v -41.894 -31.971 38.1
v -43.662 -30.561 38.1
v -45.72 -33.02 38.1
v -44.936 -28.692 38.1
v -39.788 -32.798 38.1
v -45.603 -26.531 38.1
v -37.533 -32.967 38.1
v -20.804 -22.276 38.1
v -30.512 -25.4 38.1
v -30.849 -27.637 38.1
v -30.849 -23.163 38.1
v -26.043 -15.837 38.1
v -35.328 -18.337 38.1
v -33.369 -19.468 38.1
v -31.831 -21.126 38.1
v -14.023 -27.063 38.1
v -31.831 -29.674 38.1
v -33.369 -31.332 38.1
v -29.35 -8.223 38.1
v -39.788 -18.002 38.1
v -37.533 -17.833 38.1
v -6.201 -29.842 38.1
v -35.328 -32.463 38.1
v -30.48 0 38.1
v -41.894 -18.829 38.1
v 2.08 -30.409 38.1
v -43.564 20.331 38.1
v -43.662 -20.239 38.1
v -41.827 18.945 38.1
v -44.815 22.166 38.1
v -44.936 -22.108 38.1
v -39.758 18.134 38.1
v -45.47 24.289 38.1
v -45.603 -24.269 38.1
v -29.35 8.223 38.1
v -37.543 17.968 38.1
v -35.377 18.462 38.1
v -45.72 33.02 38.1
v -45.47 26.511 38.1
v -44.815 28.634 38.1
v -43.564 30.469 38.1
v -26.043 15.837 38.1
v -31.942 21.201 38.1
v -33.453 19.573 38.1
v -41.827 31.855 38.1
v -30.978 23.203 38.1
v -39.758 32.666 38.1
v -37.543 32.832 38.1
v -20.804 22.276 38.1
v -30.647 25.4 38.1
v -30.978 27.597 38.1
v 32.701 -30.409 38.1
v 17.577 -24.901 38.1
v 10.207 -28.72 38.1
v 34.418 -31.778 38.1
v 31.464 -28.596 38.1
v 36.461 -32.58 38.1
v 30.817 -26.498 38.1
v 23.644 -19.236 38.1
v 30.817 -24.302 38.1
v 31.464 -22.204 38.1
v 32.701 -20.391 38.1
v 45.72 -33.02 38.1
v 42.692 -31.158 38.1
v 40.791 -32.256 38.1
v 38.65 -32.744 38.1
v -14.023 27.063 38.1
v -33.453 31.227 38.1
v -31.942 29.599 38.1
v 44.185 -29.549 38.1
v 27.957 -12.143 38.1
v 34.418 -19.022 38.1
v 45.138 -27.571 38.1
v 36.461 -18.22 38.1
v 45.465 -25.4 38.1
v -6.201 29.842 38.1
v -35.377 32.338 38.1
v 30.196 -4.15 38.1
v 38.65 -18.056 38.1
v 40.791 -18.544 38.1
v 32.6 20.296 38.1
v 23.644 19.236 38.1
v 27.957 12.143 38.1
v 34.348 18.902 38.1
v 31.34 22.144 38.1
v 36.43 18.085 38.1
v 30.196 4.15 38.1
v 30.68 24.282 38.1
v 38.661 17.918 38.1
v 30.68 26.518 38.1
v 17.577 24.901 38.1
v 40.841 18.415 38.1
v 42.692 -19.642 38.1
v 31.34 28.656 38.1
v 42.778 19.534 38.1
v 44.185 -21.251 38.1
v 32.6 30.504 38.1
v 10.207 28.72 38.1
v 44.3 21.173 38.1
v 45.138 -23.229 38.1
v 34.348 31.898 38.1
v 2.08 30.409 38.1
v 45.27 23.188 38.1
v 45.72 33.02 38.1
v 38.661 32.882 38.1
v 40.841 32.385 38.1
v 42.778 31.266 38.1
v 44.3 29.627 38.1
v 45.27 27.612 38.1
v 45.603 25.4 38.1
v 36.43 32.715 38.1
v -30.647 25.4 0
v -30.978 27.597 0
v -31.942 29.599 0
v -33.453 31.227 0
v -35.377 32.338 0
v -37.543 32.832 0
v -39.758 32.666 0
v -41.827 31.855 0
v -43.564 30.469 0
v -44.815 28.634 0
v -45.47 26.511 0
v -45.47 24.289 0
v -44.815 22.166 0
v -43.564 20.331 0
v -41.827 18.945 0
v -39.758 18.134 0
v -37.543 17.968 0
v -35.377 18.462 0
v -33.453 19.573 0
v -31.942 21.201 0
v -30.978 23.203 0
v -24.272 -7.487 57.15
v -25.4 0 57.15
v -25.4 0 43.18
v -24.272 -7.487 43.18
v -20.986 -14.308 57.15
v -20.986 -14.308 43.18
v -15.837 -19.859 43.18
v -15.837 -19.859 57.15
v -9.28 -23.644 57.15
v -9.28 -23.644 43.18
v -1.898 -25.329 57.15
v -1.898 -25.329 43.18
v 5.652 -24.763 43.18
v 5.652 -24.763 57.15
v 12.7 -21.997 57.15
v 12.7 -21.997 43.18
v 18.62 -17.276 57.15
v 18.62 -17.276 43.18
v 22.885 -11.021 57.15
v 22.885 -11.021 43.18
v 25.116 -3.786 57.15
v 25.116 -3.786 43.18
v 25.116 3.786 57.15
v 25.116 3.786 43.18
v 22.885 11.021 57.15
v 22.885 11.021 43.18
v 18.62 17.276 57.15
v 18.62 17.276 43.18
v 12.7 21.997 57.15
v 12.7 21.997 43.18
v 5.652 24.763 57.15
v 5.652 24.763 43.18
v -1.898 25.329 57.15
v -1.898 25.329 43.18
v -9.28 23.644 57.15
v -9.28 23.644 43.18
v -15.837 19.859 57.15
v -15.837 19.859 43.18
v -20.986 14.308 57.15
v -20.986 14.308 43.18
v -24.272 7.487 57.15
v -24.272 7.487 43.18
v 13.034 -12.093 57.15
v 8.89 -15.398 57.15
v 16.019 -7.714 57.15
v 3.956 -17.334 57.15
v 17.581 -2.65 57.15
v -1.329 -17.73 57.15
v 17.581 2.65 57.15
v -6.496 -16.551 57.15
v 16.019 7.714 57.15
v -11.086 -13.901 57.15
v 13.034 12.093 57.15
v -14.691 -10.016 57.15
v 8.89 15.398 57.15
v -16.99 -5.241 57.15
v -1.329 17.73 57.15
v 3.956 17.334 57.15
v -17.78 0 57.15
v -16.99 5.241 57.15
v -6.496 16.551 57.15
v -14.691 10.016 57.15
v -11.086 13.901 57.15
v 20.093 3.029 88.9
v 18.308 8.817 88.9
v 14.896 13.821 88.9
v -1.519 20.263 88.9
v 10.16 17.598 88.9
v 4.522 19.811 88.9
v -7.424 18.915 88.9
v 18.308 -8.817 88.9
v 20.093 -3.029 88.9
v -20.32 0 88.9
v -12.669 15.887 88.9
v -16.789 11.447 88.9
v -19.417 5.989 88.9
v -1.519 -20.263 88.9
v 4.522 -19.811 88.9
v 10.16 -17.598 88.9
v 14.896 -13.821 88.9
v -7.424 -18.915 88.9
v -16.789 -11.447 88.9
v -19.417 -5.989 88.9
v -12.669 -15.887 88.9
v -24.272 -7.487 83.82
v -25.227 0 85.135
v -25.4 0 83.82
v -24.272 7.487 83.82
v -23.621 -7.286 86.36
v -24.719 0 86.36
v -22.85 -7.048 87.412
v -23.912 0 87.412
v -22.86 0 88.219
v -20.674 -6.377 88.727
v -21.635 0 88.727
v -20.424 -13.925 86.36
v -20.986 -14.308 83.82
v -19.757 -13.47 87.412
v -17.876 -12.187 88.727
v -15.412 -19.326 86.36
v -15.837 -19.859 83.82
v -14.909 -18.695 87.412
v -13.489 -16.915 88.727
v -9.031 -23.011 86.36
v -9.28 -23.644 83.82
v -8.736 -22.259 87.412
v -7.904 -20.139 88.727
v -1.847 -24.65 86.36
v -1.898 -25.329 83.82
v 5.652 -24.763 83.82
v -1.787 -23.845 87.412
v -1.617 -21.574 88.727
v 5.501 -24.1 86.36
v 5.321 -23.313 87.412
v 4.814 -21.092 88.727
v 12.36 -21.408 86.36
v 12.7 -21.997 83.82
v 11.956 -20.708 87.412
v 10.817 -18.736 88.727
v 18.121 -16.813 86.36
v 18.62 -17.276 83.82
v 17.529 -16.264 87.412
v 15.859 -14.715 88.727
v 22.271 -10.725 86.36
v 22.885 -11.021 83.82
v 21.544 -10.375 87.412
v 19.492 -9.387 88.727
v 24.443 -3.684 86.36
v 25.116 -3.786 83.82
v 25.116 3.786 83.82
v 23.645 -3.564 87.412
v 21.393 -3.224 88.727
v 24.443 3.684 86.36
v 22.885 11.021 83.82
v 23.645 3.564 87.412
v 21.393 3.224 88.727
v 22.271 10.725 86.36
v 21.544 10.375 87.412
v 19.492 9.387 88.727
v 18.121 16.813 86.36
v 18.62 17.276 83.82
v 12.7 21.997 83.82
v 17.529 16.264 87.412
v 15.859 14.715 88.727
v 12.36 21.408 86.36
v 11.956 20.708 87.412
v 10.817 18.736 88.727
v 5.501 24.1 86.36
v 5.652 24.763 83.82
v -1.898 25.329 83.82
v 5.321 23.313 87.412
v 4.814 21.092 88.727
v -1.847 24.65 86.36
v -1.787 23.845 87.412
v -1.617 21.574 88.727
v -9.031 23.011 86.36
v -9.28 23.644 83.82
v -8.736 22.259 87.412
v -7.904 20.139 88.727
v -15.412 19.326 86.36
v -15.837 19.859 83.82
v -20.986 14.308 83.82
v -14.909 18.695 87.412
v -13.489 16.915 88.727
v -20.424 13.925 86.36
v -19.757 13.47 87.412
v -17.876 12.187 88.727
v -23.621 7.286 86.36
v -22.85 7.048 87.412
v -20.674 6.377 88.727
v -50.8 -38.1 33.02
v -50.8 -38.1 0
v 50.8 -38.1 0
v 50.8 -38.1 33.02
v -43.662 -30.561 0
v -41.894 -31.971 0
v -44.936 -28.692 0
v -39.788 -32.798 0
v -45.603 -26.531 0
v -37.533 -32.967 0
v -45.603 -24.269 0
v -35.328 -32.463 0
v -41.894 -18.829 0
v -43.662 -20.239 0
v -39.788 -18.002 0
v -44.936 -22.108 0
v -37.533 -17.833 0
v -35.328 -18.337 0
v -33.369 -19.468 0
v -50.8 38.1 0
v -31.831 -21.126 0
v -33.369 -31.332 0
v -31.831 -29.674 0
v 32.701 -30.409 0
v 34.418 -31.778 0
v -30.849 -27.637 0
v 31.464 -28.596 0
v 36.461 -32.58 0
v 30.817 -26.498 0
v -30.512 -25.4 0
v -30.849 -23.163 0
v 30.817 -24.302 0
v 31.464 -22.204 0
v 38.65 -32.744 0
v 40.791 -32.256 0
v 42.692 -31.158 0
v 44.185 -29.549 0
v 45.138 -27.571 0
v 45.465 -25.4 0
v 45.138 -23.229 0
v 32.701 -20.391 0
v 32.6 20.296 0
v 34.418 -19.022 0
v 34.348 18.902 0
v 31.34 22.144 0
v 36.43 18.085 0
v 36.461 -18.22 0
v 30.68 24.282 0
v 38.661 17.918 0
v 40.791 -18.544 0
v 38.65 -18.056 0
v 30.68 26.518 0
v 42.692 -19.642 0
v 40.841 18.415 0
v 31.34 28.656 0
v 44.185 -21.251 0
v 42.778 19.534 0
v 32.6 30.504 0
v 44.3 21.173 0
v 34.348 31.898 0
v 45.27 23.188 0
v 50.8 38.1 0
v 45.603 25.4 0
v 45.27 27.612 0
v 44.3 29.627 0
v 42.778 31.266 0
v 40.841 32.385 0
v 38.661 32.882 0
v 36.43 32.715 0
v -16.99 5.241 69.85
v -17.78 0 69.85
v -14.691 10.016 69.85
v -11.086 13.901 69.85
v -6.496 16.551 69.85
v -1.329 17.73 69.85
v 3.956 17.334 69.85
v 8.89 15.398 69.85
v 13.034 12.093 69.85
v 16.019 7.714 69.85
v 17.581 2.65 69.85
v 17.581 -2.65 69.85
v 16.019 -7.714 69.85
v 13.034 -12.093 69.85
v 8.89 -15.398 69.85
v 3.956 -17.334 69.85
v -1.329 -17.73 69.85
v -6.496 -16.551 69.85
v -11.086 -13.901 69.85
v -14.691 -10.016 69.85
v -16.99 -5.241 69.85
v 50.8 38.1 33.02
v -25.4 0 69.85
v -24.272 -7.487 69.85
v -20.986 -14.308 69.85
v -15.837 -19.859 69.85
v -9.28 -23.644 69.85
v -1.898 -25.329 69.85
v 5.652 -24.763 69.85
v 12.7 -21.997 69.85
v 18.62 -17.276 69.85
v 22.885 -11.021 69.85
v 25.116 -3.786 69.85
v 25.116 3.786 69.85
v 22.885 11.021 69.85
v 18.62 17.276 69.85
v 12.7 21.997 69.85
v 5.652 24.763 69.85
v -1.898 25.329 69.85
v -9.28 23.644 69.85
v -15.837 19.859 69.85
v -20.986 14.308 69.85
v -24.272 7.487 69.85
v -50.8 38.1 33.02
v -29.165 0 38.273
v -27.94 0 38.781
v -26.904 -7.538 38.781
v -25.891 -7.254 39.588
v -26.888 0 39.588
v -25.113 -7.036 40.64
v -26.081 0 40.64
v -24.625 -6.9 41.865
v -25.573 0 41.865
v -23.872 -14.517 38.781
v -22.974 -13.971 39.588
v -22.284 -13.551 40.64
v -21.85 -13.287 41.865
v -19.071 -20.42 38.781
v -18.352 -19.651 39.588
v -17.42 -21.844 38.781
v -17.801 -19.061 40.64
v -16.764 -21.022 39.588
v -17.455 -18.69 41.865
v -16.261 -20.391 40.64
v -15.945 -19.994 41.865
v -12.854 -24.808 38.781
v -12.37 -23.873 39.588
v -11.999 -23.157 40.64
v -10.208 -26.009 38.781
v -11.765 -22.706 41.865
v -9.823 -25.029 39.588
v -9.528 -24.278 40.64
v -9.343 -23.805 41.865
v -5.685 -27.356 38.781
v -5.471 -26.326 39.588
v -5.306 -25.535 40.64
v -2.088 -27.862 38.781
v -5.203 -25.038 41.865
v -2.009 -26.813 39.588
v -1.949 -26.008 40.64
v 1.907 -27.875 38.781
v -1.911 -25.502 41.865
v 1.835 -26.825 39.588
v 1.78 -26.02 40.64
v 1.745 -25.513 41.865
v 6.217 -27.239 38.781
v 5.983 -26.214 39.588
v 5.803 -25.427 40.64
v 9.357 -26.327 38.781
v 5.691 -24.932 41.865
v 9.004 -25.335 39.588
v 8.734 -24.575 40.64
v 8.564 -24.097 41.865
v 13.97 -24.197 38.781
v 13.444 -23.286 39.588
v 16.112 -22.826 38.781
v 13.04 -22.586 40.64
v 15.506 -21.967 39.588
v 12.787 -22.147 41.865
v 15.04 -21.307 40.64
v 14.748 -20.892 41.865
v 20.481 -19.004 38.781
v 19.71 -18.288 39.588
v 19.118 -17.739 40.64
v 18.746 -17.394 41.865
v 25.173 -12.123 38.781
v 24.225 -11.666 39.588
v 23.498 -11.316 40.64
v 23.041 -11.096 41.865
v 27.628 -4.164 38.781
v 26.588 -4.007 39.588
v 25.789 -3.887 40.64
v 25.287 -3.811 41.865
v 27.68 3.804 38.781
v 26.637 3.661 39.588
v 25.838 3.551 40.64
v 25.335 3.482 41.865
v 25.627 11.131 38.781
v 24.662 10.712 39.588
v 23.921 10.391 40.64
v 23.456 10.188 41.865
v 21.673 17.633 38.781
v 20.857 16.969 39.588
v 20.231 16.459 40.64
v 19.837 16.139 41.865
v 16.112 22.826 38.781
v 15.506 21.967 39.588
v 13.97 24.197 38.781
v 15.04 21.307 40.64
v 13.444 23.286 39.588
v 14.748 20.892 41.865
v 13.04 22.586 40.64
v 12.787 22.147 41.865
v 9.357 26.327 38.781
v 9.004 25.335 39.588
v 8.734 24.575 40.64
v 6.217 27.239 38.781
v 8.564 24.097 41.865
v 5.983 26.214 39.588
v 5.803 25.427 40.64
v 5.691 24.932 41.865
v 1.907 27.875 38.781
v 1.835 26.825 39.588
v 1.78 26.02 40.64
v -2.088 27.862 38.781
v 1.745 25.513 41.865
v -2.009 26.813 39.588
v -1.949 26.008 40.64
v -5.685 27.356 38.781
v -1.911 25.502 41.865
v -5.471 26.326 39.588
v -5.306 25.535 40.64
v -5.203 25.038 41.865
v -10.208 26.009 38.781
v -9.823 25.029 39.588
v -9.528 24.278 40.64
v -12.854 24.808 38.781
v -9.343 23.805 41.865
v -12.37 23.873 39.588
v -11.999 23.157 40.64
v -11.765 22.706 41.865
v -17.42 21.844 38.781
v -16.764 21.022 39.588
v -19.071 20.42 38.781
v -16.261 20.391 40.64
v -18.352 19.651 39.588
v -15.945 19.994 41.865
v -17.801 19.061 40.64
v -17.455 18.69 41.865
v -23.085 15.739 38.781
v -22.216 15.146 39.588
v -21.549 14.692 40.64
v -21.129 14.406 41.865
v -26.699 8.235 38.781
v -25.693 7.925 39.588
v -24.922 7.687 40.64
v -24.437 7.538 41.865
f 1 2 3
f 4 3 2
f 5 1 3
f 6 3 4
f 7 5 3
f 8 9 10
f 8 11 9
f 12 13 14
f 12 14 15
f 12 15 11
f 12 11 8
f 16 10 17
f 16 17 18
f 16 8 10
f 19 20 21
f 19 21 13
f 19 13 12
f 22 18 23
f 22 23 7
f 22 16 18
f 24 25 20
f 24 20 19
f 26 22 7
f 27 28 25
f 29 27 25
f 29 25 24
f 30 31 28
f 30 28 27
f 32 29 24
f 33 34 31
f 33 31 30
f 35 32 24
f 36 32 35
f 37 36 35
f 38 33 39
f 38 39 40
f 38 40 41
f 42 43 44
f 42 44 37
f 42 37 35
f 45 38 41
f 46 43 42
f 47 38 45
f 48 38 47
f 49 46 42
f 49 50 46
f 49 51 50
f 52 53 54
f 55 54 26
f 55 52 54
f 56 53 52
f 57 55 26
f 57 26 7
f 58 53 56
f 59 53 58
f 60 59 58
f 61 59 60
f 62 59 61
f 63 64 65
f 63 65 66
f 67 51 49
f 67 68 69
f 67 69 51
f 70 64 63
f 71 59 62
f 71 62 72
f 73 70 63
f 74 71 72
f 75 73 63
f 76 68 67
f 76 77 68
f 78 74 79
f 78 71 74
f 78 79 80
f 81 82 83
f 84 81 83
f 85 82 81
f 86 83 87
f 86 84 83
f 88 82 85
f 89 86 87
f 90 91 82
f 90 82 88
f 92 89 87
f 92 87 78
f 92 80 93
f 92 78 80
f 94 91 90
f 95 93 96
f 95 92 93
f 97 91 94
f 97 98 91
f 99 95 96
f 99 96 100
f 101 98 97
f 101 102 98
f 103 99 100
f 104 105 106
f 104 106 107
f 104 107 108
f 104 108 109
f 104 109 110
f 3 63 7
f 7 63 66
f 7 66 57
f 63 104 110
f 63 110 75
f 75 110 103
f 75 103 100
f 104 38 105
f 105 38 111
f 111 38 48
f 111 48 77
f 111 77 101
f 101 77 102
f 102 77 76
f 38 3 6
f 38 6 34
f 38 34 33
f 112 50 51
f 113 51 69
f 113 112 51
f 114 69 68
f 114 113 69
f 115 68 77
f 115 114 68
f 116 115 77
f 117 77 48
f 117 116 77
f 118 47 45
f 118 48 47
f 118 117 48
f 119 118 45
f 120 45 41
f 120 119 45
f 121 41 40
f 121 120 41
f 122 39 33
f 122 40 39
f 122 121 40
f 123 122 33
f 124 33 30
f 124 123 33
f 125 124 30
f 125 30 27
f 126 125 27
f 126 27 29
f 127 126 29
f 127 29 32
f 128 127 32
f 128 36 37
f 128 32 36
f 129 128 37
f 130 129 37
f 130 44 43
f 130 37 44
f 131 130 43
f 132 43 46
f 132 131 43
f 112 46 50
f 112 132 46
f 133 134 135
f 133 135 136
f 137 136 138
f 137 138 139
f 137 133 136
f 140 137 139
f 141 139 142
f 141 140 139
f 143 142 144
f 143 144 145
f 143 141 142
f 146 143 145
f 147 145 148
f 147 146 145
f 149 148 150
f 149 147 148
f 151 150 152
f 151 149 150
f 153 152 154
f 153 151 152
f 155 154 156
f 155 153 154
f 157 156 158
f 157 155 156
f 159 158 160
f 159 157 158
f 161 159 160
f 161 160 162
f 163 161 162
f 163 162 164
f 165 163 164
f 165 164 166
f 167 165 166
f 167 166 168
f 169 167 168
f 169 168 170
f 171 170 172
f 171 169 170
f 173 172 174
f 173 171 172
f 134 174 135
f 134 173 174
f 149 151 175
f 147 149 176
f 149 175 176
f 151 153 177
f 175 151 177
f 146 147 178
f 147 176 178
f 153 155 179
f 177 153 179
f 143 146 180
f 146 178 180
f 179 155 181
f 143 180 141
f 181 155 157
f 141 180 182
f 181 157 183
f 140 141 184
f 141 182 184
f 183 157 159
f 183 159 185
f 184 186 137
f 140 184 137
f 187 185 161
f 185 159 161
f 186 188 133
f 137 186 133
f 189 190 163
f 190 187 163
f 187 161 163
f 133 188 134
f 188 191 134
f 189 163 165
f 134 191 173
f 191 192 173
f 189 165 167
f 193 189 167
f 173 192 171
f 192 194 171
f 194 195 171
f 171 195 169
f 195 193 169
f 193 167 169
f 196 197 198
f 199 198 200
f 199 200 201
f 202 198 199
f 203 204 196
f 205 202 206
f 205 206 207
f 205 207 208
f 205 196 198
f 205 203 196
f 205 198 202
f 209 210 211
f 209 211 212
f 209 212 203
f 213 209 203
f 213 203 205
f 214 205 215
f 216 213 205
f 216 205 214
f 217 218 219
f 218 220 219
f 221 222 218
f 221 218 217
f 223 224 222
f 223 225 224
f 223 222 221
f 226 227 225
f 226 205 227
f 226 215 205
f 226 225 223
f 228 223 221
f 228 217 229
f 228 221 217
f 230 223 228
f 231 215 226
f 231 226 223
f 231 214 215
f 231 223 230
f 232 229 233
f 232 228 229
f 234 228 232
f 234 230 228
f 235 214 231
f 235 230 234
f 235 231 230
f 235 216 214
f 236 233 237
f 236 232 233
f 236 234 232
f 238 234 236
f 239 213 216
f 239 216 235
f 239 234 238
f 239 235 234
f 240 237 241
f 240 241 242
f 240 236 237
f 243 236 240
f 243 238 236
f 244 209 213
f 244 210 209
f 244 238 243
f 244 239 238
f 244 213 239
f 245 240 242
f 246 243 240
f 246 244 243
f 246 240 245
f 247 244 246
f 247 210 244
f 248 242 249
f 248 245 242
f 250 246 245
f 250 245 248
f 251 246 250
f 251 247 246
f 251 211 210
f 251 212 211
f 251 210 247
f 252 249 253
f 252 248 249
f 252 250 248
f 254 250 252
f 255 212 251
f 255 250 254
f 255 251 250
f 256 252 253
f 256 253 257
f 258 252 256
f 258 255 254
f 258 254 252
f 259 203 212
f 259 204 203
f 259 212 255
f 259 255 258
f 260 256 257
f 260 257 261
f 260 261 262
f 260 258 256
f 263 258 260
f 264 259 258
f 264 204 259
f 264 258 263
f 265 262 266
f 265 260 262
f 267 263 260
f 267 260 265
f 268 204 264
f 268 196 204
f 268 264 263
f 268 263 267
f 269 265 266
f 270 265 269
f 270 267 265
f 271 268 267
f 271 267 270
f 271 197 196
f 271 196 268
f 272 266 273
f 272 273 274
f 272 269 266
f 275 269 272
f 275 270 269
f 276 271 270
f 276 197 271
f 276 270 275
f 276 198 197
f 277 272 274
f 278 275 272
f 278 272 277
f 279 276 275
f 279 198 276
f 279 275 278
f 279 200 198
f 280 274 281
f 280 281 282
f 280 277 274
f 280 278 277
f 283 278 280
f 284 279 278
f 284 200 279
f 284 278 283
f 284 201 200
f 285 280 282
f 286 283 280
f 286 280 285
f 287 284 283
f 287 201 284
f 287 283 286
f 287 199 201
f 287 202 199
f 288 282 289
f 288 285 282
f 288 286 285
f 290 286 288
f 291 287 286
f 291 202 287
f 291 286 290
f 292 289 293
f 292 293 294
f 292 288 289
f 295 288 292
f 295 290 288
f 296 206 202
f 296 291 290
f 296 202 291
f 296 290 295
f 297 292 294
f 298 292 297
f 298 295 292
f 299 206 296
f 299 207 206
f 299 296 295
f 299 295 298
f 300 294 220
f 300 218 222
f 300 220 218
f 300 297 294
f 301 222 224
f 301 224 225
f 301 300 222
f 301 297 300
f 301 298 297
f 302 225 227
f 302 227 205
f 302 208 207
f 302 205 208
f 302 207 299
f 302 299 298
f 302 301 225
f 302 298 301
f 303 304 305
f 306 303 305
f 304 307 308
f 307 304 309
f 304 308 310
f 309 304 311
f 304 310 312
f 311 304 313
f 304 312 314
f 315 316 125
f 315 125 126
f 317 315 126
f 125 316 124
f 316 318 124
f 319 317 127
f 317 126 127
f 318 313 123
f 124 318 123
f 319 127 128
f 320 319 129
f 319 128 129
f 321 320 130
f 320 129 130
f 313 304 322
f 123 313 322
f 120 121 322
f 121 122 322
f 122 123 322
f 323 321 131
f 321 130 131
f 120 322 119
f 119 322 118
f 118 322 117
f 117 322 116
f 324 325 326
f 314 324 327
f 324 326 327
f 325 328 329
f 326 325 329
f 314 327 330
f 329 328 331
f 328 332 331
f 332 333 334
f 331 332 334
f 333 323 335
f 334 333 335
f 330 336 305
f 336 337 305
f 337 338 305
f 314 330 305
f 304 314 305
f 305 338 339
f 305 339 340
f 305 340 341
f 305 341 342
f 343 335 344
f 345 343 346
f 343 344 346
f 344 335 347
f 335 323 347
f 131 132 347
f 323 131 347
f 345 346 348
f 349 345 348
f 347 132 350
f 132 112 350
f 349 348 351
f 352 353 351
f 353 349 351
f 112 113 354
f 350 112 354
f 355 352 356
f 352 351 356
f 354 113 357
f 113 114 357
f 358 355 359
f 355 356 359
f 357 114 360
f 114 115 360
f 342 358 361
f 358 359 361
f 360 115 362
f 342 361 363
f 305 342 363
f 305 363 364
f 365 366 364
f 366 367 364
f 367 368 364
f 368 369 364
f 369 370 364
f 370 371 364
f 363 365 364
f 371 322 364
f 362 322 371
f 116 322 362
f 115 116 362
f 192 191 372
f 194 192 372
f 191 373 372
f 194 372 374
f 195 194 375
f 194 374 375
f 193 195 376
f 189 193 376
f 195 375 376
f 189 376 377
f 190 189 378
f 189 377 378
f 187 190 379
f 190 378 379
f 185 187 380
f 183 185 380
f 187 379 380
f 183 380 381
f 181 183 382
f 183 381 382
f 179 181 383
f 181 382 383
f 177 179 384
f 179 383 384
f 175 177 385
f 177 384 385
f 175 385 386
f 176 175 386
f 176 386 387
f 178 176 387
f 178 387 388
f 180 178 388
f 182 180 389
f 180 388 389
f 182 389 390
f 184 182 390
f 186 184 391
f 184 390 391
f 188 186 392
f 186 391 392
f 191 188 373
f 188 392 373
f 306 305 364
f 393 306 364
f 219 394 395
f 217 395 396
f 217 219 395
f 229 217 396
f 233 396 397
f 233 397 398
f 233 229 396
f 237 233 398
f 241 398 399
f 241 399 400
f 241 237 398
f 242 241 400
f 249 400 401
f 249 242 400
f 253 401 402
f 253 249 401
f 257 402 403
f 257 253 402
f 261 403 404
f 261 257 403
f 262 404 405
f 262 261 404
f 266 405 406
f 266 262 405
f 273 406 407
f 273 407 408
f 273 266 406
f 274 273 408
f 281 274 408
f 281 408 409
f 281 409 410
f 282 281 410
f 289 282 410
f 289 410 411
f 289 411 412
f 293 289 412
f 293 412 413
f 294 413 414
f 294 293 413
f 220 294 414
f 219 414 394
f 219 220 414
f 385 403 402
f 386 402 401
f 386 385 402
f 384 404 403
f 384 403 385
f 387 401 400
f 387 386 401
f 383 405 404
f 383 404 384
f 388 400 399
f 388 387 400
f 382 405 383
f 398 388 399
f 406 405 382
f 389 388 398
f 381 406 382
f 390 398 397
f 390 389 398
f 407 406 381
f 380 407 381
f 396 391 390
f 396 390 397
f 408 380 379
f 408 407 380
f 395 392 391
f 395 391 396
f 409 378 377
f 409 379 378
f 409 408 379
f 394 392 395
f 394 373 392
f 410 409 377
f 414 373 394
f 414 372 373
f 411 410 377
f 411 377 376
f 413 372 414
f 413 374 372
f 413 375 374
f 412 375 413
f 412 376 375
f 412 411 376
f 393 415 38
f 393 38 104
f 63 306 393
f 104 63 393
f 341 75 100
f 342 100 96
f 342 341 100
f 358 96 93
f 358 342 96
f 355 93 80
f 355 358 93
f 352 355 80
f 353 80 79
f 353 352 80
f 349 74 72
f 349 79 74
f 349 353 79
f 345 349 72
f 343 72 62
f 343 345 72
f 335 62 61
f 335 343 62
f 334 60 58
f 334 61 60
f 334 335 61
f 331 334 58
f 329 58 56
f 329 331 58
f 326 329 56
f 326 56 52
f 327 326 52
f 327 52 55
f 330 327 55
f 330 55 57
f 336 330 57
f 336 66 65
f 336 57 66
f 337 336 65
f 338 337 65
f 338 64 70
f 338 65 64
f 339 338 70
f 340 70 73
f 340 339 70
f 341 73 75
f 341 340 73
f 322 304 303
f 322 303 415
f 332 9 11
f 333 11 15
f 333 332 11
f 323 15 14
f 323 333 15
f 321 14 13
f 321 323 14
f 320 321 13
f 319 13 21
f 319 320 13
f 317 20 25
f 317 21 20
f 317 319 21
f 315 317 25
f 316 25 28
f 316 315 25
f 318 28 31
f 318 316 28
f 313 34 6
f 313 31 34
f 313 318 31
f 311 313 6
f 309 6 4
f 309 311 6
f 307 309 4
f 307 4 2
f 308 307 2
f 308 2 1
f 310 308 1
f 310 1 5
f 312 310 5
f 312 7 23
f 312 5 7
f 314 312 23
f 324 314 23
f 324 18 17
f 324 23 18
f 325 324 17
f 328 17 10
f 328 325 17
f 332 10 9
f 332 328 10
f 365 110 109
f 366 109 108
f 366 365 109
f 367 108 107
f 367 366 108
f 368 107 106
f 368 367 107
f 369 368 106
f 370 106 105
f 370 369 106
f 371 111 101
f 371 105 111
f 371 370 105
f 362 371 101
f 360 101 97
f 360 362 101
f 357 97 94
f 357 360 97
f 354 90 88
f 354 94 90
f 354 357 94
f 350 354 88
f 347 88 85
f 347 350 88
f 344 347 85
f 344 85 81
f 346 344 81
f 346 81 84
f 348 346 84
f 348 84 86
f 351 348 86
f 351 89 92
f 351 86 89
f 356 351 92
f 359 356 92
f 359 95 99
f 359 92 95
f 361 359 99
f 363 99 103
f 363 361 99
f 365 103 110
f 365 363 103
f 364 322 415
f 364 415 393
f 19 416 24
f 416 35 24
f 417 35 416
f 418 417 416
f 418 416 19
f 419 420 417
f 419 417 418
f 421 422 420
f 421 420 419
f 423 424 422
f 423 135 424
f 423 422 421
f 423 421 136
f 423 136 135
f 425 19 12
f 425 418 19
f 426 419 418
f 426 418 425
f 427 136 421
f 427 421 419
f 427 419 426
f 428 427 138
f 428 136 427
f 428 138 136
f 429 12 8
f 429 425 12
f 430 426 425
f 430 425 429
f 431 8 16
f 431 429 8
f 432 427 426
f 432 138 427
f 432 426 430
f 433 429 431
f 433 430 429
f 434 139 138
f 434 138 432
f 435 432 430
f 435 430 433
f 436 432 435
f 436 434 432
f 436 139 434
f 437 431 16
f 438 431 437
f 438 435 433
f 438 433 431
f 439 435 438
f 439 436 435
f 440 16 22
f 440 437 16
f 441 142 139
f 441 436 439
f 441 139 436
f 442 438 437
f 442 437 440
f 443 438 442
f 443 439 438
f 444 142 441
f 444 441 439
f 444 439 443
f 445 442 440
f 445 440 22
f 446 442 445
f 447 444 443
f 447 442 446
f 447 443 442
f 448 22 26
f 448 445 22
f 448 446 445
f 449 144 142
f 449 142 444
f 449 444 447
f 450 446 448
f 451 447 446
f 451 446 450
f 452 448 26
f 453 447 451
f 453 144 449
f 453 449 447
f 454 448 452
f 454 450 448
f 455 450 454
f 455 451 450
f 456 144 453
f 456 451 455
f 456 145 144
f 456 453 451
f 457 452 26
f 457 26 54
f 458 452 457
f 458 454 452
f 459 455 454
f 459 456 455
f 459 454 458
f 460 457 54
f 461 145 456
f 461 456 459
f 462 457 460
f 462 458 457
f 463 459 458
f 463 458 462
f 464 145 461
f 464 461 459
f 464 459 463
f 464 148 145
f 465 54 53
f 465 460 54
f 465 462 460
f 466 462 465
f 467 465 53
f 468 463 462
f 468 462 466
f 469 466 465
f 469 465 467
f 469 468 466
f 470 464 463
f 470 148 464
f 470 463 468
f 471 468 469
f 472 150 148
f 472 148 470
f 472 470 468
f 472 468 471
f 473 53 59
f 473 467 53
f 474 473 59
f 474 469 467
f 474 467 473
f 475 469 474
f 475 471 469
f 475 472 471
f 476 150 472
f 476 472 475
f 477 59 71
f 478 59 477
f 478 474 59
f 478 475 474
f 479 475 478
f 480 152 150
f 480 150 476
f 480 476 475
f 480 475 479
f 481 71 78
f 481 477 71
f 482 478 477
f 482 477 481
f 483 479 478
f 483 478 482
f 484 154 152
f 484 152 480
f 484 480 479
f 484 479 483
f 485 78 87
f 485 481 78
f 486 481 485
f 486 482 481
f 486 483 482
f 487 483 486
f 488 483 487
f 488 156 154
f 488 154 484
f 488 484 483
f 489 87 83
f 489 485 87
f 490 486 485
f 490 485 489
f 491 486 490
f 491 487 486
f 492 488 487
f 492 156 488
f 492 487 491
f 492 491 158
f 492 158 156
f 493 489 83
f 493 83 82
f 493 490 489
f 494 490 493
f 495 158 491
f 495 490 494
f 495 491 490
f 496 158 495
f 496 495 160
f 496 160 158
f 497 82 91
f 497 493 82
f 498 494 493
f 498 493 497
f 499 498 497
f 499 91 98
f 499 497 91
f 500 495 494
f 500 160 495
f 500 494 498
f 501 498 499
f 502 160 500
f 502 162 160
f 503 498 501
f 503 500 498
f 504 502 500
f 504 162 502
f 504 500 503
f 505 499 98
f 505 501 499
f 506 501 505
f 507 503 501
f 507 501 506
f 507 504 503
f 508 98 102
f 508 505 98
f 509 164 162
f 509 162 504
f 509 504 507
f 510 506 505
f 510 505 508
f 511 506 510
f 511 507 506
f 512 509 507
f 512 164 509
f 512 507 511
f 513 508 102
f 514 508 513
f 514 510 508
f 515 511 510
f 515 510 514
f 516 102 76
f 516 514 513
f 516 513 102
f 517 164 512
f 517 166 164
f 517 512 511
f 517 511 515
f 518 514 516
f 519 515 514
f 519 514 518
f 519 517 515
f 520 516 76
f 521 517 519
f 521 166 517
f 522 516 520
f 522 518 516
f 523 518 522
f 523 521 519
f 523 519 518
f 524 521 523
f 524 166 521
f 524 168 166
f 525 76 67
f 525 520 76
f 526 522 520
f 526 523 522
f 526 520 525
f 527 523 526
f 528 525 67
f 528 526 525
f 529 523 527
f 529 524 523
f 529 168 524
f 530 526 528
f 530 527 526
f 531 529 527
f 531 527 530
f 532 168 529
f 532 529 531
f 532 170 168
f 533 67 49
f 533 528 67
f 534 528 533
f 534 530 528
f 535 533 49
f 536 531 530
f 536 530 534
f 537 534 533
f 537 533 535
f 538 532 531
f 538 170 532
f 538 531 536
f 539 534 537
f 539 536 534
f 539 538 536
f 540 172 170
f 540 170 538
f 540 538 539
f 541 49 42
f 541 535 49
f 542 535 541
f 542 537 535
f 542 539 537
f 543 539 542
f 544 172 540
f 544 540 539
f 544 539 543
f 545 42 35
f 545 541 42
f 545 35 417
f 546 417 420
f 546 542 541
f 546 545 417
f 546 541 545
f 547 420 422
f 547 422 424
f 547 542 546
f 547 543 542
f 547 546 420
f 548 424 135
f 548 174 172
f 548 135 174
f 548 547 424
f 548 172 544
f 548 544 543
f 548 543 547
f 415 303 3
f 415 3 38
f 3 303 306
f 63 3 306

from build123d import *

# Parameters (mm, degrees)
F0_W     = 101.6
F0_H     = 76.2
F1_DEPTH = 38.1
F2_R     = 7.453167
F2_R_2   = 7.587908
F2_R_3   = 7.50333
F2_R_4   = 7.364953
F3_DEPTH = 38.101
F4_W     = 25.4
F4_H     = 50.8
F6_W     = 12.7
F6_H     = 12.7
F8_R     = 5.08
F9_SIZE  = 5.08


with BuildPart() as f1:
    # F0 (on Top) → F1 (new body)
    with BuildSketch(Plane.XY):
        Rectangle(F0_W, F0_H)
    extrude(amount=F1_DEPTH)

    # F2 (on Top) → F3 (cut, through all)
    with BuildSketch(Plane.XY):
        with Locations((-38.1, 25.4)):
            Circle(F2_R)
        with Locations((-38.1, -25.4)):
            Circle(F2_R_2)
        with Locations((38.1, 25.4)):
            Circle(F2_R_3)
        with Locations((38.1, -25.4)):
            Circle(F2_R_4)
    extrude(amount=F3_DEPTH, mode=Mode.SUBTRACT)

    # F4 (on Front) → F5 (revolve)
    with BuildSketch(Plane.XZ):
        with Locations((-12.7, 63.5)):
            Rectangle(F4_W, F4_H)
    revolve(axis=Axis((0, 0, 63.5), (0, 0, 1)))

    # F6 (on Front) → F7 (revolve, cut)
    with BuildSketch(Plane.XZ):
        with Locations((-24.13, 63.5)):
            Rectangle(F6_W, F6_H)
    revolve(axis=Axis((0, 0, 88.9), (0, 0, -1)), mode=Mode.SUBTRACT)

    # F8
    f8_edges = [f1.edges().sort_by_distance(p)[0] for p in [
        (25.4, 0, 88.9),
        (25.4, 0, 38.1),
    ]]
    fillet(f8_edges, radius=F8_R)

    # F9
    f9_edges = [f1.edges().sort_by_distance(p)[0] for p in [
        (0, -38.1, 38.1),
        (50.8, 0, 38.1),
        (0, 38.1, 38.1),
        (-50.8, 0, 38.1),
    ]]
    chamfer(f9_edges, length=F9_SIZE)


solid = f1.part
